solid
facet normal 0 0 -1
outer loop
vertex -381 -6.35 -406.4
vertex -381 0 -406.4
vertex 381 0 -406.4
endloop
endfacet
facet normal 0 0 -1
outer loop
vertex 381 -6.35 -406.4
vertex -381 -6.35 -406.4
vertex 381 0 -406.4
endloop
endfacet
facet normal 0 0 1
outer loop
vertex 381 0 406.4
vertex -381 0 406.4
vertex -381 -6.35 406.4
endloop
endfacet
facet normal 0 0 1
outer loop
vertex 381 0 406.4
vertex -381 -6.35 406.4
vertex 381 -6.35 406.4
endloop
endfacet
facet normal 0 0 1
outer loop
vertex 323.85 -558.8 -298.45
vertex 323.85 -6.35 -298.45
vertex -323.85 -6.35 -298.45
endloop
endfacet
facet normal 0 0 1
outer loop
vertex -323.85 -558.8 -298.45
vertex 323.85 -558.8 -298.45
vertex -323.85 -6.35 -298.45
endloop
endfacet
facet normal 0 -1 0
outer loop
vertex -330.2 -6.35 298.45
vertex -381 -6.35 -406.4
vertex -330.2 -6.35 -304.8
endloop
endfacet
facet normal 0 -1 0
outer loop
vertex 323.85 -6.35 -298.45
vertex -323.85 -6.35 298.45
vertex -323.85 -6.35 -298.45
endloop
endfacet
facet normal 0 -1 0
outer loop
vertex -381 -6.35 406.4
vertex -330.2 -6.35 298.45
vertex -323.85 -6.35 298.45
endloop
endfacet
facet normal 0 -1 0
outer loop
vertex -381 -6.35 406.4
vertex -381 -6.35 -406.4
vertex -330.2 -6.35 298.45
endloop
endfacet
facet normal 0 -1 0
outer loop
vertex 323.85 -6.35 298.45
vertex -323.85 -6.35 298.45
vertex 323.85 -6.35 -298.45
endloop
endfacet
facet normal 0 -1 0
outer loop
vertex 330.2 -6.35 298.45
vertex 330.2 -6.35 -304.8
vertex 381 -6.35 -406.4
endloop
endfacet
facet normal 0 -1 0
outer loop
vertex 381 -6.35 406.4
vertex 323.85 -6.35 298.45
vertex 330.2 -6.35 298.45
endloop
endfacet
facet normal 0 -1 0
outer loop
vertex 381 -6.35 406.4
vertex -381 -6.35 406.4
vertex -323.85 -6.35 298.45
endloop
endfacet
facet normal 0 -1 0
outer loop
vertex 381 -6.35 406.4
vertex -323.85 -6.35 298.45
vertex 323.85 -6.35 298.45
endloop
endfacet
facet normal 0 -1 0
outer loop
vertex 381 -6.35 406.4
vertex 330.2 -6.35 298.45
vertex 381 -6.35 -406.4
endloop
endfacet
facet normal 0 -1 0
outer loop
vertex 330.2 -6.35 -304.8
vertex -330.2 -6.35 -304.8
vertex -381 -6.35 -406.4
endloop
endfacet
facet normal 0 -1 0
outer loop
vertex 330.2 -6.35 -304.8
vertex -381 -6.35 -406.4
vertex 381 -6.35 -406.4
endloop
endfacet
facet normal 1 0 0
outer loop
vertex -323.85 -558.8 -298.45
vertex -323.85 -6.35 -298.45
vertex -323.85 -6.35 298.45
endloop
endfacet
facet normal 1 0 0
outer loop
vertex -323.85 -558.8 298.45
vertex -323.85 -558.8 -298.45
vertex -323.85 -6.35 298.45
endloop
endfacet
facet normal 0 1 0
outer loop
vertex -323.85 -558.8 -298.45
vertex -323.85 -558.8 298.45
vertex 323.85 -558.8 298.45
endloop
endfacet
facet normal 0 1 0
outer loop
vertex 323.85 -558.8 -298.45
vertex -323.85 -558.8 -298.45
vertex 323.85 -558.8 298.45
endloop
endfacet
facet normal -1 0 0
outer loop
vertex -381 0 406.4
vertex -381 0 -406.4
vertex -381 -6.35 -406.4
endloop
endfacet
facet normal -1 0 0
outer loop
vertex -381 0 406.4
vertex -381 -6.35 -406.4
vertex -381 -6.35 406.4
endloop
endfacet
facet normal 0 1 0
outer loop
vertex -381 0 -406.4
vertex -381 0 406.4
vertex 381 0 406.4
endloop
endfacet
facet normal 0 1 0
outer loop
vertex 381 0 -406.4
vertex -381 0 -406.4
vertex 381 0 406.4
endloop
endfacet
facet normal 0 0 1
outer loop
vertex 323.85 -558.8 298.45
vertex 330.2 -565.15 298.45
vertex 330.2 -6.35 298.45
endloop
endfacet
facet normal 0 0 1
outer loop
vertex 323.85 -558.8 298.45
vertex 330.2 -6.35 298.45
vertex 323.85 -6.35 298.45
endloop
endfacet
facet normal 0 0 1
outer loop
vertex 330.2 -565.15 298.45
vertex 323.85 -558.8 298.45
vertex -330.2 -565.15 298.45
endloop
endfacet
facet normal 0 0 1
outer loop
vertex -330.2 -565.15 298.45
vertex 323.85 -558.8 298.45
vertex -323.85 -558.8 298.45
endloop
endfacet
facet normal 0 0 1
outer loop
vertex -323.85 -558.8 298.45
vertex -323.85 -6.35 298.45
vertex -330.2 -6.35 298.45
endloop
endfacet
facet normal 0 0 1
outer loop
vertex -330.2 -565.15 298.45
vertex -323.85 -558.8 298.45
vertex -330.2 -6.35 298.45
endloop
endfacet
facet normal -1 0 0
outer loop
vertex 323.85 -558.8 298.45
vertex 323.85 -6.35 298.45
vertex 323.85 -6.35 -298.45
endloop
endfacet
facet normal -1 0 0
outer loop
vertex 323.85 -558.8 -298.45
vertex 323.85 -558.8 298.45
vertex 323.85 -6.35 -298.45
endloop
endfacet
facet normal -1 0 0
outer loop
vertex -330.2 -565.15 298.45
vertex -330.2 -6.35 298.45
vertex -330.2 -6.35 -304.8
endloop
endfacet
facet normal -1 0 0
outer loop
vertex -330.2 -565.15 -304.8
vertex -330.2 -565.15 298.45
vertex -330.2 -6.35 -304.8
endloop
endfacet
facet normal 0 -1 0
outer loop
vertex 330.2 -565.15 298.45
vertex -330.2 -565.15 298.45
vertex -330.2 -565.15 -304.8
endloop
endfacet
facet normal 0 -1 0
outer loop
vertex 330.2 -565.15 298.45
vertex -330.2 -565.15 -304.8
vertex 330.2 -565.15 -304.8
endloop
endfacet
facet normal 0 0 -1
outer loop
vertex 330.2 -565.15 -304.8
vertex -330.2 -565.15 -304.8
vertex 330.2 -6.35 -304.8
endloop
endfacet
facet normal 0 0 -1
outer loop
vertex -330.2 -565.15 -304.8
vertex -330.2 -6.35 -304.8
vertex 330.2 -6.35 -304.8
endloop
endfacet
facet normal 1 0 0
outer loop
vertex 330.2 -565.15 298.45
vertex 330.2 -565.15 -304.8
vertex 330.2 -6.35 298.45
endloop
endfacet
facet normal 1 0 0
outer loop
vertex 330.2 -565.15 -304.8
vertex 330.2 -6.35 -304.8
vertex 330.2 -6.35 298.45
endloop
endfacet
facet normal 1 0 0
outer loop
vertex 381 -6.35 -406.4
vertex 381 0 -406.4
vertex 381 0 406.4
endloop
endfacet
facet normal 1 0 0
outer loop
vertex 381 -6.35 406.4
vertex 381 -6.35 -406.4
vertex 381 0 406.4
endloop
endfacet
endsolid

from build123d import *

# Parameters (mm, degrees)
F0_W     = 762
F0_H     = 812.8
F1_DEPTH = 6.35
F3_DEPTH = 552.45
F4_W     = 647.7000117302
F4_H     = 596.9000117302
F5_DEPTH = 6.35


with BuildPart() as f1:
    # F0 (on Front) → F1 (new body)
    with BuildSketch(Plane.XZ):
        Rectangle(F0_W, F0_H)
    extrude(amount=F1_DEPTH)

    # F2 (on face) → F3 (join)
    with BuildSketch(Plane.XZ.offset(6.35)):
        Polygon((-330.2, -304.8), (330.2, -304.8), (330.2, 298.4500058651), (323.8500058651, 298.4500058651), (323.8500058651, -298.4500058651), (-323.8500058651, -298.4500058651), (-323.8500058651, 298.4500058651), (-330.2, 298.4500058651), align=None)
    extrude(amount=F3_DEPTH)

    # F4 (on face) → F5 (join)
    with BuildSketch(Plane.XZ.offset(558.8)):
        Polygon((-330.2, 298.4500058651), (-330.2, -304.8), (330.2, -304.8), (330.2, 298.4500058651), (323.8500058651, 298.4500058651), (323.8500058651, -298.4500058651), (-323.8500058651, -298.4500058651), (-323.8500058651, 298.4500058651), align=None)
        Rectangle(F4_W, F4_H)
    extrude(amount=F5_DEPTH)


solid = f1.part
